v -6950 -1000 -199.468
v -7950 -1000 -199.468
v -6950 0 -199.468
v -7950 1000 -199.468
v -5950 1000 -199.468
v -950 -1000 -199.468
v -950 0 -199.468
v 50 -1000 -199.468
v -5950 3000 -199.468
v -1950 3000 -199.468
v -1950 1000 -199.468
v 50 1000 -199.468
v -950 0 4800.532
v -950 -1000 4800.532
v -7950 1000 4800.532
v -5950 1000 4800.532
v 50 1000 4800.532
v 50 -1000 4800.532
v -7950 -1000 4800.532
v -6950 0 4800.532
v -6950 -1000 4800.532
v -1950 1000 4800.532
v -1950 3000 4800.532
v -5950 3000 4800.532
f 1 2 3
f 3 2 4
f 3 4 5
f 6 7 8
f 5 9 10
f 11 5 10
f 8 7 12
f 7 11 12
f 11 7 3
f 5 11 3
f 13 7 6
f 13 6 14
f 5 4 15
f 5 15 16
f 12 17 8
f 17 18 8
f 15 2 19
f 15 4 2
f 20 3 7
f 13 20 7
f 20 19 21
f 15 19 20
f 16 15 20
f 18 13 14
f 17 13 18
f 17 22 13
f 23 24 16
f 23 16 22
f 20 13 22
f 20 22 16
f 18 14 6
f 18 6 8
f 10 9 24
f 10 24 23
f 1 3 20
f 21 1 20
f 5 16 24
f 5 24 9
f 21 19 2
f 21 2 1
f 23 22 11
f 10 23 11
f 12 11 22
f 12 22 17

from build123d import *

# Parameters (mm, degrees)
CROQUIS2_W              = 8000
CROQUIS2_H              = 5000
SALIENTE_EXTRUIR1_DEPTH = 1000
CROQUIS3_W              = 4000
CROQUIS3_H              = 5000
SALIENTE_EXTRUIR2_DEPTH = 2000
CROQUIS4_2_W            = 1000
CROQUIS4_2_H            = 5000
SALIENTE_EXTRUIR4_DEPTH = 1000


with BuildPart() as part:
    # Croquis2 → Saliente-Extruir1 (new body)
    with BuildSketch(Plane(origin=(0, 0, 0), x_dir=(1, 0, 0), z_dir=(0, 1, 0))):
        with Locations((-3950, -2300.531749032)):
            Rectangle(CROQUIS2_W, CROQUIS2_H)
    extrude(amount=SALIENTE_EXTRUIR1_DEPTH)

    # Croquis3 → Saliente-Extruir2 (add)
    with BuildSketch(Plane(origin=(0, 1000, 0), x_dir=(1, 0, 0), z_dir=(0, 1, 0))):
        with Locations((-3950, -2300.531749032)):
            Rectangle(CROQUIS3_W, CROQUIS3_H)
    extrude(amount=SALIENTE_EXTRUIR2_DEPTH)

    # Croquis4<2> → Saliente-Extruir4 (add)
    with BuildSketch(Plane.XZ):
        with Locations((-7450, 2300.531749032)):
            Rectangle(CROQUIS4_2_W, CROQUIS4_2_H)
        with Locations((-450, 2300.531749032)):
            Rectangle(CROQUIS4_2_W, CROQUIS4_2_H)
    extrude(amount=SALIENTE_EXTRUIR4_DEPTH)


solid = part.part
